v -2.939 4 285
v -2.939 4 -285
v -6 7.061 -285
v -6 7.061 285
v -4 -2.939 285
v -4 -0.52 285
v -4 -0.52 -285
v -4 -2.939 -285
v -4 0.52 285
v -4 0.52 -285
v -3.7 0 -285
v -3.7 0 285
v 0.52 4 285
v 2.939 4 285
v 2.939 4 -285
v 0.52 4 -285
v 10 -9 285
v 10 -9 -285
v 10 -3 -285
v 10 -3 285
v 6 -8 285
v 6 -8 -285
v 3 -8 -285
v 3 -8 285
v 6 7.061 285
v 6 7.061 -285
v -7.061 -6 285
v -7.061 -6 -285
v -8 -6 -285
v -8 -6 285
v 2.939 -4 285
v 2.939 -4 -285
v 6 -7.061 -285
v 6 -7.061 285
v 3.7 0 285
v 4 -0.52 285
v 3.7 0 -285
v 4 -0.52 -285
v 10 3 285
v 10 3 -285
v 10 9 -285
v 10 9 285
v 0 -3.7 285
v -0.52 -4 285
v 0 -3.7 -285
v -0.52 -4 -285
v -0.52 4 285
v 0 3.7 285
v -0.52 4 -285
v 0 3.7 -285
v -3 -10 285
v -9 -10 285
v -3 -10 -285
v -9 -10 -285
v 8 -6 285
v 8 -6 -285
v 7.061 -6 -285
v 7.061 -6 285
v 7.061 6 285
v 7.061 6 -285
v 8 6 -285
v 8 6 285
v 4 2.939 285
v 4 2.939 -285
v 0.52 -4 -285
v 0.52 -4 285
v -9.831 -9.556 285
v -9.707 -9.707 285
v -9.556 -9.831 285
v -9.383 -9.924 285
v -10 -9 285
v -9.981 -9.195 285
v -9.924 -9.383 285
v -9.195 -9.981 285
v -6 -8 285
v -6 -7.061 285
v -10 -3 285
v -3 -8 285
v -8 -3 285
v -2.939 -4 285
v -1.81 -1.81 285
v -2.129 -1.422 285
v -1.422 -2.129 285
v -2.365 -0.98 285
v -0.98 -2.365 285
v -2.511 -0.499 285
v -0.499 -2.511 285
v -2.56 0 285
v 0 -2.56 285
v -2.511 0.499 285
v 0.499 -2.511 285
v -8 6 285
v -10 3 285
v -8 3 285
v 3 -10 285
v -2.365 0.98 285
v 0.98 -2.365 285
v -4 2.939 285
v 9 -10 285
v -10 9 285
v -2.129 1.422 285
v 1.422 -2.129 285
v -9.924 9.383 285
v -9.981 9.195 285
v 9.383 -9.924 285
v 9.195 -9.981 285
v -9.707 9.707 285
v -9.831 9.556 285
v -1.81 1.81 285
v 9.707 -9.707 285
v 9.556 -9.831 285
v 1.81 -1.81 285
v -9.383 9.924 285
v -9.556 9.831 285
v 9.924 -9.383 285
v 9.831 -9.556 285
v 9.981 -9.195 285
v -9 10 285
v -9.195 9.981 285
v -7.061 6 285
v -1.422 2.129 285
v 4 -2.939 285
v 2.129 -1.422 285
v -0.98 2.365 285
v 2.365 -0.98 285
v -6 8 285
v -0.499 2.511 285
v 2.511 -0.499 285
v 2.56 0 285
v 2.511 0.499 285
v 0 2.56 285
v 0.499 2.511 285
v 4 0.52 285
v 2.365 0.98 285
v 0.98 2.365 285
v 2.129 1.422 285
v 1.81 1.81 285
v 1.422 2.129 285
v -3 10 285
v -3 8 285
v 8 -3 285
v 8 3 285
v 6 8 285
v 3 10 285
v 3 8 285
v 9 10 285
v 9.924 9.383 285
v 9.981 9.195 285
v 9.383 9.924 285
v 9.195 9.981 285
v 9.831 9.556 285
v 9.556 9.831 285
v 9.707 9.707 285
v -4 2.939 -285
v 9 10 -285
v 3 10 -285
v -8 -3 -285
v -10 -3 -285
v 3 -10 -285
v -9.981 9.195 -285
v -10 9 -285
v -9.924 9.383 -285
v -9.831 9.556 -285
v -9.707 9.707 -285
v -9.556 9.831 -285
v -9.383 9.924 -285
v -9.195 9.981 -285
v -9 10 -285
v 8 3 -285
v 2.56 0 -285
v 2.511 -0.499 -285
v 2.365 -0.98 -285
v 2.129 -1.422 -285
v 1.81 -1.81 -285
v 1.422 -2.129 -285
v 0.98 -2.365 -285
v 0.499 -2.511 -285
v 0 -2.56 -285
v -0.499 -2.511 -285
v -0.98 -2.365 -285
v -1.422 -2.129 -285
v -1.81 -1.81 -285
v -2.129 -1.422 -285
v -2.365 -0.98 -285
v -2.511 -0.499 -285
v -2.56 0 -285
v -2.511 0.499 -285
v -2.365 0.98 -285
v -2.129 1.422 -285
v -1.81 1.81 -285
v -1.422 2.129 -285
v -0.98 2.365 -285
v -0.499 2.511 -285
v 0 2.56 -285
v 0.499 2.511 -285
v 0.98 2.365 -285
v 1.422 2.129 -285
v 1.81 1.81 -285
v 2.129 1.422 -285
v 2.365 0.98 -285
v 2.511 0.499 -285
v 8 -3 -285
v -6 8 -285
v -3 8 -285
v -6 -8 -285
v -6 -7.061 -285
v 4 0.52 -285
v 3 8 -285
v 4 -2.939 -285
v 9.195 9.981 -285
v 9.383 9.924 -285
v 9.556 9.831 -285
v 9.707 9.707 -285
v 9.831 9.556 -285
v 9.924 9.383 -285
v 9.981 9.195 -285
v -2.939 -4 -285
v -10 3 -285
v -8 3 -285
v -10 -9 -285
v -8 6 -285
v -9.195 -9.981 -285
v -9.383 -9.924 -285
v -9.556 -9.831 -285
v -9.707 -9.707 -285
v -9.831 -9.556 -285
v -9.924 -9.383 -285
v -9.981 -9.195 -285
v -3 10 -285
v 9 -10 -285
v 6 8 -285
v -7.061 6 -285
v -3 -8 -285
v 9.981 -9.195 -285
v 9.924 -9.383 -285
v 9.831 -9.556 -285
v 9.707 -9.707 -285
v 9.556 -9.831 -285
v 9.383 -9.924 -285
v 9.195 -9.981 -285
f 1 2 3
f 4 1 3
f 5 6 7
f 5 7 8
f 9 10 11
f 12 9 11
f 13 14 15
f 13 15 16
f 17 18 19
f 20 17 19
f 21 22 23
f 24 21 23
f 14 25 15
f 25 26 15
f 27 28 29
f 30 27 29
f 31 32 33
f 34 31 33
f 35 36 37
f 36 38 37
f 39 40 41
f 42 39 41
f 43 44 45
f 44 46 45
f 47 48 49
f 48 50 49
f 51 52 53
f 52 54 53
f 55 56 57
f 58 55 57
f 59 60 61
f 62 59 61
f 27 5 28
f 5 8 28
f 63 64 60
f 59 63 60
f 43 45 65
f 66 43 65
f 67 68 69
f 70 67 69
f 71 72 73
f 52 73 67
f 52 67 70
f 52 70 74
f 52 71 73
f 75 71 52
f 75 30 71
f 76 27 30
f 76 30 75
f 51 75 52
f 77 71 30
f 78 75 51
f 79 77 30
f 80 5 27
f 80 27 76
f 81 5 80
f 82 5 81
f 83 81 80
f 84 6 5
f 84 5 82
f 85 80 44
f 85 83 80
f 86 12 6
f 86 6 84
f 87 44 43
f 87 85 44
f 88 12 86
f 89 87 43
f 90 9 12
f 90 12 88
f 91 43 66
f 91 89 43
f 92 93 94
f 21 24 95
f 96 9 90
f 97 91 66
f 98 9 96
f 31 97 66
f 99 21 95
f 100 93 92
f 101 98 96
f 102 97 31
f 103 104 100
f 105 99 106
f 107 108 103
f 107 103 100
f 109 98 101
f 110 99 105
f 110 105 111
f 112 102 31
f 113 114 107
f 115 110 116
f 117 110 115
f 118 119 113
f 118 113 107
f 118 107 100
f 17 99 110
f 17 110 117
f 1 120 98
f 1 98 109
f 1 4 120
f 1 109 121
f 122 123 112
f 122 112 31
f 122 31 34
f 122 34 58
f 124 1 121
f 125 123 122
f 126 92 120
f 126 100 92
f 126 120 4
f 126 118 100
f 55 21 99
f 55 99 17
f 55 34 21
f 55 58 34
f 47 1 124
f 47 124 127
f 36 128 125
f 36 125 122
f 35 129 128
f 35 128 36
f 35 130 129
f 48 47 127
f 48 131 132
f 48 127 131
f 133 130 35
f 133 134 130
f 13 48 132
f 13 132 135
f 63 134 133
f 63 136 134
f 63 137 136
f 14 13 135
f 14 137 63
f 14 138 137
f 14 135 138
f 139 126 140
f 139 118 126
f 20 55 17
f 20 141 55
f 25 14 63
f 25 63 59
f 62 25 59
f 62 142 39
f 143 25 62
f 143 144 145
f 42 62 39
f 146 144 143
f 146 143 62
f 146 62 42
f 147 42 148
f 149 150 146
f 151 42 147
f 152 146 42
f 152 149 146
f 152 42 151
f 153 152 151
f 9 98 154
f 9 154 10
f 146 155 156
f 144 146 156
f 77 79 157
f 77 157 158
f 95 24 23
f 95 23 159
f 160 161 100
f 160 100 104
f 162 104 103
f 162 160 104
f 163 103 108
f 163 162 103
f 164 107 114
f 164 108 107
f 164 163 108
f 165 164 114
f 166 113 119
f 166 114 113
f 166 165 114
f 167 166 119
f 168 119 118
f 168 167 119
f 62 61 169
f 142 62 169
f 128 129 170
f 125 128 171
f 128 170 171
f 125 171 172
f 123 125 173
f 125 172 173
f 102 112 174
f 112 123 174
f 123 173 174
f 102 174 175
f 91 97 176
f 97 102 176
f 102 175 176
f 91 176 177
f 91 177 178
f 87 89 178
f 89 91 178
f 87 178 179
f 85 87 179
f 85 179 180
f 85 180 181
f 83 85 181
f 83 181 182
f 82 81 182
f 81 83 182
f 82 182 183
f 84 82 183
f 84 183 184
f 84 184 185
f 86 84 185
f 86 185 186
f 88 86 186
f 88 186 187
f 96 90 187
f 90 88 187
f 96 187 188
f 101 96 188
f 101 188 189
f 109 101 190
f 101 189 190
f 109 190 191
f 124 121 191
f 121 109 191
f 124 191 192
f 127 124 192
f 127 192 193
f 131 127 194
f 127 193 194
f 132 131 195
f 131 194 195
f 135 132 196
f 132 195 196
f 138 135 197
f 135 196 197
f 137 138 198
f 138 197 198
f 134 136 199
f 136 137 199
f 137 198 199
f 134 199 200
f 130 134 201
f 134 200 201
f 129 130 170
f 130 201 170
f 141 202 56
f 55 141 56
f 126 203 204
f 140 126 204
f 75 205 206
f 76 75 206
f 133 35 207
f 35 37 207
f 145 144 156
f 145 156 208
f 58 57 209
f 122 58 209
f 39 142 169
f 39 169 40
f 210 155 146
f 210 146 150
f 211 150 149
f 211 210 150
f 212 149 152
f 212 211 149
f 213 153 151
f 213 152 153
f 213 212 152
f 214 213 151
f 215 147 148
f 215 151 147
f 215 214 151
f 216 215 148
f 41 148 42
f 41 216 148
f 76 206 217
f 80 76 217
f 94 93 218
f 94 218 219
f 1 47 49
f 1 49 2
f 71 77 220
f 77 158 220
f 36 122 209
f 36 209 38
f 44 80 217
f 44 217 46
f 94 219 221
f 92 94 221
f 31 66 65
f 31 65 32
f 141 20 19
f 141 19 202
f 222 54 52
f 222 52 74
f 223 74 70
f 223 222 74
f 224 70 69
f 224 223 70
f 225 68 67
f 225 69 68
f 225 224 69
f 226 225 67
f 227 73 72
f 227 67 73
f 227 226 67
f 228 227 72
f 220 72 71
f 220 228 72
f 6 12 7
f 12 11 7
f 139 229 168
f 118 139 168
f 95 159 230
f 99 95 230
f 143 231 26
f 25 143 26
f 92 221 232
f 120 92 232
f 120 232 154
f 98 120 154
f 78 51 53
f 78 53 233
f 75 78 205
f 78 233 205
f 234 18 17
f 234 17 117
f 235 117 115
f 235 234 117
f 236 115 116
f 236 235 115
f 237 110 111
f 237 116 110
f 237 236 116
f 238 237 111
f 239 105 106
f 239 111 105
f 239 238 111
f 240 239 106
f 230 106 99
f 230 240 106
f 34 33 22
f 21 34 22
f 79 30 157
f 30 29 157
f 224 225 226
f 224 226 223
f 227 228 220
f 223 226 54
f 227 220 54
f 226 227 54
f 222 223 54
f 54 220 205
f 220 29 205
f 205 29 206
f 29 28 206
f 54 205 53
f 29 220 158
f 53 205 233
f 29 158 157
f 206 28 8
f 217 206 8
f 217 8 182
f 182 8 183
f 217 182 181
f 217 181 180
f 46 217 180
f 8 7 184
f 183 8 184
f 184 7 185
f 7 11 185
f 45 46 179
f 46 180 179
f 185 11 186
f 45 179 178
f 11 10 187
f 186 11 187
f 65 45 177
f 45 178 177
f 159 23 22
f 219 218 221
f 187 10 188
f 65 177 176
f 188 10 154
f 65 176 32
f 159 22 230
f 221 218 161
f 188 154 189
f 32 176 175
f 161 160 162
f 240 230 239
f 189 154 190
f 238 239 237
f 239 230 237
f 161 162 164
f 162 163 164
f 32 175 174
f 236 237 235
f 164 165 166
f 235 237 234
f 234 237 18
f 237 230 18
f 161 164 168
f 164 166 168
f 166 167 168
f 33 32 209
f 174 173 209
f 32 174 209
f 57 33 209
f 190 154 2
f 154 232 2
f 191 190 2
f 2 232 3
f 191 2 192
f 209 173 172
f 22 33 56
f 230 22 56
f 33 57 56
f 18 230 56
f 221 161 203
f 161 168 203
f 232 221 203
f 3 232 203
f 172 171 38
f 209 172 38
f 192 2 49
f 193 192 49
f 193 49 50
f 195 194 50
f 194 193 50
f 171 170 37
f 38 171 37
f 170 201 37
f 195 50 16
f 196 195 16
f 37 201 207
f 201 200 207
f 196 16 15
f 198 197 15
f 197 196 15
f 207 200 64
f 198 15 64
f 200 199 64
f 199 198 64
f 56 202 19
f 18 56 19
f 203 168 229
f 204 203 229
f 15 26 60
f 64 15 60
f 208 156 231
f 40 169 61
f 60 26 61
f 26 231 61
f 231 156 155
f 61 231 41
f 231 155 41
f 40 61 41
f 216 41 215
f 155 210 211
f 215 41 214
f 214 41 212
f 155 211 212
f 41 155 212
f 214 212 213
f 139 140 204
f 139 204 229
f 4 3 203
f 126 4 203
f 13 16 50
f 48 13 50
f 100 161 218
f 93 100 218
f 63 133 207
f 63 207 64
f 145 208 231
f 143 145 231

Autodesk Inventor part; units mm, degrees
ref_plane "YZ Plane" through (0, 0, 0) normal (1, 0, 0) x (0, 1, 0)
ref_plane "XZ Plane" through (0, 0, 0) normal (0, 1, 0) x (-1, 0, 0)
ref_plane "XY Plane" through (0, 0, 0) normal (0, 0, 1) x (1, 0, 0)
sketch "Skizze1" plane through (0, 0, 0) normal (0, 0, 1) x (1, 0, 0)
  line L0 (3.7, 0) -> (4, 0.5196)
  line L1 (4, 0.5196) -> (4, 2.9393)
  line L2 (4, 2.9393) -> (7.0607, 6)
  line L3 (7.0607, 6) -> (8, 6)
  line L4 (8, 6) -> (8, 3)
  line L5 (8, 3) -> (10, 3)
  line L6 (10, 3) -> (10, 9)
  arc A0 (10, 9) -> (9, 10) centre (9, 9) ccw
  line L7 (9, 10) -> (3, 10)
  line L8 (3, 10) -> (3, 8)
  line L9 (3, 8) -> (6, 8)
  line L10 (6, 8) -> (6, 7.0607)
  line L11 (6, 7.0607) -> (2.9393, 4)
  line L12 (2.9393, 4) -> (0.5196, 4)
  line L13 (0.5196, 4) -> (0, 3.7)
  circle A1 centre (0, 0) radius 2.56
  line L14 (0, 0) -> (9.7071, 9.7071) construction
  line L15 (-14.2899, 0) -> (14.2899, 0) construction
  line L16 (0, -14.2899) -> (0, 14.2899) construction
  line L17 (0, 3.7) -> (-0.5196, 4)
  line L18 (-0.5196, 4) -> (-2.9393, 4)
  line L19 (-3, 8) -> (-3, 10)
  line L20 (-4, 0.5196) -> (-3.7, 0)
  line L21 (-4, 2.9393) -> (-4, 0.5196)
  line L22 (-6, 7.0607) -> (-6, 8)
  line L23 (-6, 8) -> (-3, 8)
  line L24 (-7.0607, 6) -> (-4, 2.9393)
  line L25 (0, 0) -> (-9.7071, 9.7071) construction
  line L26 (-8, 6) -> (-7.0607, 6)
  line L27 (-2.9393, 4) -> (-6, 7.0607)
  line L28 (-8, 3) -> (-8, 6)
  line L29 (-10, 3) -> (-8, 3)
  arc A2 (-9, 10) -> (-10, 9) centre (-9, 9) ccw
  line L30 (-10, 9) -> (-10, 3)
  line L31 (-3, 10) -> (-9, 10)
  line L32 (-3.7, 0) -> (-4, -0.5196)
  line L33 (-4, -0.5196) -> (-4, -2.9393)
  line L34 (-8, -3) -> (-10, -3)
  line L35 (-0.5196, -4) -> (0, -3.7)
  line L36 (-2.9393, -4) -> (-0.5196, -4)
  line L37 (-7.0607, -6) -> (-8, -6)
  line L38 (-8, -6) -> (-8, -3)
  line L39 (-6, -7.0607) -> (-2.9393, -4)
  line L40 (0, 0) -> (-9.7071, -9.7071) construction
  line L41 (-6, -8) -> (-6, -7.0607)
  line L42 (-4, -2.9393) -> (-7.0607, -6)
  line L43 (-3, -8) -> (-6, -8)
  line L44 (-3, -10) -> (-3, -8)
  arc A3 (-10, -9) -> (-9, -10) centre (-9, -9) ccw
  line L45 (-9, -10) -> (-3, -10)
  line L46 (-10, -3) -> (-10, -9)
  line L47 (0, -3.7) -> (0.5196, -4)
  line L48 (0.5196, -4) -> (2.9393, -4)
  line L49 (3, -8) -> (3, -10)
  line L50 (4, -0.5196) -> (3.7, 0)
  line L51 (4, -2.9393) -> (4, -0.5196)
  line L52 (6, -7.0607) -> (6, -8)
  line L53 (6, -8) -> (3, -8)
  line L54 (7.0607, -6) -> (4, -2.9393)
  line L55 (0, 0) -> (9.7071, -9.7071) construction
  line L56 (8, -6) -> (7.0607, -6)
  line L57 (2.9393, -4) -> (6, -7.0607)
  line L58 (8, -3) -> (8, -6)
  line L59 (10, -3) -> (8, -3)
  arc A4 (9, -10) -> (10, -9) centre (9, -9) ccw
  line L60 (10, -9) -> (10, -3)
  line L61 (3, -10) -> (9, -10)
  point P0 (-3.7, 0)
  point P1 (0, -3.7)
  dimension "d14" = 1.5
  dimension "d15" = 3
  dimension "d16" = 4
  dimension "d17" = 0.3
  dimension "d18" = 2
  dimension "d19" = 6
  dimension "d20" = 10
  dimension "d21" = 10
  dimension "d22" = 2
  dimension "d23" = 3
  dimension "d24" = 6
  dimension "d25" = 1
  dimension "d26" = 4
  dimension "d27" = 0.3
  dimension "d28" = 0.5196
  dimension "d29" = 0.5196
  dimension "d30" = 5.12
  dimension "d33" = 360
extrude "Extrusion1" add sketch "Skizze1" along normal mid plane 570
properties part number "Extrusion_20x20x570" material "Aluminium 6061"
